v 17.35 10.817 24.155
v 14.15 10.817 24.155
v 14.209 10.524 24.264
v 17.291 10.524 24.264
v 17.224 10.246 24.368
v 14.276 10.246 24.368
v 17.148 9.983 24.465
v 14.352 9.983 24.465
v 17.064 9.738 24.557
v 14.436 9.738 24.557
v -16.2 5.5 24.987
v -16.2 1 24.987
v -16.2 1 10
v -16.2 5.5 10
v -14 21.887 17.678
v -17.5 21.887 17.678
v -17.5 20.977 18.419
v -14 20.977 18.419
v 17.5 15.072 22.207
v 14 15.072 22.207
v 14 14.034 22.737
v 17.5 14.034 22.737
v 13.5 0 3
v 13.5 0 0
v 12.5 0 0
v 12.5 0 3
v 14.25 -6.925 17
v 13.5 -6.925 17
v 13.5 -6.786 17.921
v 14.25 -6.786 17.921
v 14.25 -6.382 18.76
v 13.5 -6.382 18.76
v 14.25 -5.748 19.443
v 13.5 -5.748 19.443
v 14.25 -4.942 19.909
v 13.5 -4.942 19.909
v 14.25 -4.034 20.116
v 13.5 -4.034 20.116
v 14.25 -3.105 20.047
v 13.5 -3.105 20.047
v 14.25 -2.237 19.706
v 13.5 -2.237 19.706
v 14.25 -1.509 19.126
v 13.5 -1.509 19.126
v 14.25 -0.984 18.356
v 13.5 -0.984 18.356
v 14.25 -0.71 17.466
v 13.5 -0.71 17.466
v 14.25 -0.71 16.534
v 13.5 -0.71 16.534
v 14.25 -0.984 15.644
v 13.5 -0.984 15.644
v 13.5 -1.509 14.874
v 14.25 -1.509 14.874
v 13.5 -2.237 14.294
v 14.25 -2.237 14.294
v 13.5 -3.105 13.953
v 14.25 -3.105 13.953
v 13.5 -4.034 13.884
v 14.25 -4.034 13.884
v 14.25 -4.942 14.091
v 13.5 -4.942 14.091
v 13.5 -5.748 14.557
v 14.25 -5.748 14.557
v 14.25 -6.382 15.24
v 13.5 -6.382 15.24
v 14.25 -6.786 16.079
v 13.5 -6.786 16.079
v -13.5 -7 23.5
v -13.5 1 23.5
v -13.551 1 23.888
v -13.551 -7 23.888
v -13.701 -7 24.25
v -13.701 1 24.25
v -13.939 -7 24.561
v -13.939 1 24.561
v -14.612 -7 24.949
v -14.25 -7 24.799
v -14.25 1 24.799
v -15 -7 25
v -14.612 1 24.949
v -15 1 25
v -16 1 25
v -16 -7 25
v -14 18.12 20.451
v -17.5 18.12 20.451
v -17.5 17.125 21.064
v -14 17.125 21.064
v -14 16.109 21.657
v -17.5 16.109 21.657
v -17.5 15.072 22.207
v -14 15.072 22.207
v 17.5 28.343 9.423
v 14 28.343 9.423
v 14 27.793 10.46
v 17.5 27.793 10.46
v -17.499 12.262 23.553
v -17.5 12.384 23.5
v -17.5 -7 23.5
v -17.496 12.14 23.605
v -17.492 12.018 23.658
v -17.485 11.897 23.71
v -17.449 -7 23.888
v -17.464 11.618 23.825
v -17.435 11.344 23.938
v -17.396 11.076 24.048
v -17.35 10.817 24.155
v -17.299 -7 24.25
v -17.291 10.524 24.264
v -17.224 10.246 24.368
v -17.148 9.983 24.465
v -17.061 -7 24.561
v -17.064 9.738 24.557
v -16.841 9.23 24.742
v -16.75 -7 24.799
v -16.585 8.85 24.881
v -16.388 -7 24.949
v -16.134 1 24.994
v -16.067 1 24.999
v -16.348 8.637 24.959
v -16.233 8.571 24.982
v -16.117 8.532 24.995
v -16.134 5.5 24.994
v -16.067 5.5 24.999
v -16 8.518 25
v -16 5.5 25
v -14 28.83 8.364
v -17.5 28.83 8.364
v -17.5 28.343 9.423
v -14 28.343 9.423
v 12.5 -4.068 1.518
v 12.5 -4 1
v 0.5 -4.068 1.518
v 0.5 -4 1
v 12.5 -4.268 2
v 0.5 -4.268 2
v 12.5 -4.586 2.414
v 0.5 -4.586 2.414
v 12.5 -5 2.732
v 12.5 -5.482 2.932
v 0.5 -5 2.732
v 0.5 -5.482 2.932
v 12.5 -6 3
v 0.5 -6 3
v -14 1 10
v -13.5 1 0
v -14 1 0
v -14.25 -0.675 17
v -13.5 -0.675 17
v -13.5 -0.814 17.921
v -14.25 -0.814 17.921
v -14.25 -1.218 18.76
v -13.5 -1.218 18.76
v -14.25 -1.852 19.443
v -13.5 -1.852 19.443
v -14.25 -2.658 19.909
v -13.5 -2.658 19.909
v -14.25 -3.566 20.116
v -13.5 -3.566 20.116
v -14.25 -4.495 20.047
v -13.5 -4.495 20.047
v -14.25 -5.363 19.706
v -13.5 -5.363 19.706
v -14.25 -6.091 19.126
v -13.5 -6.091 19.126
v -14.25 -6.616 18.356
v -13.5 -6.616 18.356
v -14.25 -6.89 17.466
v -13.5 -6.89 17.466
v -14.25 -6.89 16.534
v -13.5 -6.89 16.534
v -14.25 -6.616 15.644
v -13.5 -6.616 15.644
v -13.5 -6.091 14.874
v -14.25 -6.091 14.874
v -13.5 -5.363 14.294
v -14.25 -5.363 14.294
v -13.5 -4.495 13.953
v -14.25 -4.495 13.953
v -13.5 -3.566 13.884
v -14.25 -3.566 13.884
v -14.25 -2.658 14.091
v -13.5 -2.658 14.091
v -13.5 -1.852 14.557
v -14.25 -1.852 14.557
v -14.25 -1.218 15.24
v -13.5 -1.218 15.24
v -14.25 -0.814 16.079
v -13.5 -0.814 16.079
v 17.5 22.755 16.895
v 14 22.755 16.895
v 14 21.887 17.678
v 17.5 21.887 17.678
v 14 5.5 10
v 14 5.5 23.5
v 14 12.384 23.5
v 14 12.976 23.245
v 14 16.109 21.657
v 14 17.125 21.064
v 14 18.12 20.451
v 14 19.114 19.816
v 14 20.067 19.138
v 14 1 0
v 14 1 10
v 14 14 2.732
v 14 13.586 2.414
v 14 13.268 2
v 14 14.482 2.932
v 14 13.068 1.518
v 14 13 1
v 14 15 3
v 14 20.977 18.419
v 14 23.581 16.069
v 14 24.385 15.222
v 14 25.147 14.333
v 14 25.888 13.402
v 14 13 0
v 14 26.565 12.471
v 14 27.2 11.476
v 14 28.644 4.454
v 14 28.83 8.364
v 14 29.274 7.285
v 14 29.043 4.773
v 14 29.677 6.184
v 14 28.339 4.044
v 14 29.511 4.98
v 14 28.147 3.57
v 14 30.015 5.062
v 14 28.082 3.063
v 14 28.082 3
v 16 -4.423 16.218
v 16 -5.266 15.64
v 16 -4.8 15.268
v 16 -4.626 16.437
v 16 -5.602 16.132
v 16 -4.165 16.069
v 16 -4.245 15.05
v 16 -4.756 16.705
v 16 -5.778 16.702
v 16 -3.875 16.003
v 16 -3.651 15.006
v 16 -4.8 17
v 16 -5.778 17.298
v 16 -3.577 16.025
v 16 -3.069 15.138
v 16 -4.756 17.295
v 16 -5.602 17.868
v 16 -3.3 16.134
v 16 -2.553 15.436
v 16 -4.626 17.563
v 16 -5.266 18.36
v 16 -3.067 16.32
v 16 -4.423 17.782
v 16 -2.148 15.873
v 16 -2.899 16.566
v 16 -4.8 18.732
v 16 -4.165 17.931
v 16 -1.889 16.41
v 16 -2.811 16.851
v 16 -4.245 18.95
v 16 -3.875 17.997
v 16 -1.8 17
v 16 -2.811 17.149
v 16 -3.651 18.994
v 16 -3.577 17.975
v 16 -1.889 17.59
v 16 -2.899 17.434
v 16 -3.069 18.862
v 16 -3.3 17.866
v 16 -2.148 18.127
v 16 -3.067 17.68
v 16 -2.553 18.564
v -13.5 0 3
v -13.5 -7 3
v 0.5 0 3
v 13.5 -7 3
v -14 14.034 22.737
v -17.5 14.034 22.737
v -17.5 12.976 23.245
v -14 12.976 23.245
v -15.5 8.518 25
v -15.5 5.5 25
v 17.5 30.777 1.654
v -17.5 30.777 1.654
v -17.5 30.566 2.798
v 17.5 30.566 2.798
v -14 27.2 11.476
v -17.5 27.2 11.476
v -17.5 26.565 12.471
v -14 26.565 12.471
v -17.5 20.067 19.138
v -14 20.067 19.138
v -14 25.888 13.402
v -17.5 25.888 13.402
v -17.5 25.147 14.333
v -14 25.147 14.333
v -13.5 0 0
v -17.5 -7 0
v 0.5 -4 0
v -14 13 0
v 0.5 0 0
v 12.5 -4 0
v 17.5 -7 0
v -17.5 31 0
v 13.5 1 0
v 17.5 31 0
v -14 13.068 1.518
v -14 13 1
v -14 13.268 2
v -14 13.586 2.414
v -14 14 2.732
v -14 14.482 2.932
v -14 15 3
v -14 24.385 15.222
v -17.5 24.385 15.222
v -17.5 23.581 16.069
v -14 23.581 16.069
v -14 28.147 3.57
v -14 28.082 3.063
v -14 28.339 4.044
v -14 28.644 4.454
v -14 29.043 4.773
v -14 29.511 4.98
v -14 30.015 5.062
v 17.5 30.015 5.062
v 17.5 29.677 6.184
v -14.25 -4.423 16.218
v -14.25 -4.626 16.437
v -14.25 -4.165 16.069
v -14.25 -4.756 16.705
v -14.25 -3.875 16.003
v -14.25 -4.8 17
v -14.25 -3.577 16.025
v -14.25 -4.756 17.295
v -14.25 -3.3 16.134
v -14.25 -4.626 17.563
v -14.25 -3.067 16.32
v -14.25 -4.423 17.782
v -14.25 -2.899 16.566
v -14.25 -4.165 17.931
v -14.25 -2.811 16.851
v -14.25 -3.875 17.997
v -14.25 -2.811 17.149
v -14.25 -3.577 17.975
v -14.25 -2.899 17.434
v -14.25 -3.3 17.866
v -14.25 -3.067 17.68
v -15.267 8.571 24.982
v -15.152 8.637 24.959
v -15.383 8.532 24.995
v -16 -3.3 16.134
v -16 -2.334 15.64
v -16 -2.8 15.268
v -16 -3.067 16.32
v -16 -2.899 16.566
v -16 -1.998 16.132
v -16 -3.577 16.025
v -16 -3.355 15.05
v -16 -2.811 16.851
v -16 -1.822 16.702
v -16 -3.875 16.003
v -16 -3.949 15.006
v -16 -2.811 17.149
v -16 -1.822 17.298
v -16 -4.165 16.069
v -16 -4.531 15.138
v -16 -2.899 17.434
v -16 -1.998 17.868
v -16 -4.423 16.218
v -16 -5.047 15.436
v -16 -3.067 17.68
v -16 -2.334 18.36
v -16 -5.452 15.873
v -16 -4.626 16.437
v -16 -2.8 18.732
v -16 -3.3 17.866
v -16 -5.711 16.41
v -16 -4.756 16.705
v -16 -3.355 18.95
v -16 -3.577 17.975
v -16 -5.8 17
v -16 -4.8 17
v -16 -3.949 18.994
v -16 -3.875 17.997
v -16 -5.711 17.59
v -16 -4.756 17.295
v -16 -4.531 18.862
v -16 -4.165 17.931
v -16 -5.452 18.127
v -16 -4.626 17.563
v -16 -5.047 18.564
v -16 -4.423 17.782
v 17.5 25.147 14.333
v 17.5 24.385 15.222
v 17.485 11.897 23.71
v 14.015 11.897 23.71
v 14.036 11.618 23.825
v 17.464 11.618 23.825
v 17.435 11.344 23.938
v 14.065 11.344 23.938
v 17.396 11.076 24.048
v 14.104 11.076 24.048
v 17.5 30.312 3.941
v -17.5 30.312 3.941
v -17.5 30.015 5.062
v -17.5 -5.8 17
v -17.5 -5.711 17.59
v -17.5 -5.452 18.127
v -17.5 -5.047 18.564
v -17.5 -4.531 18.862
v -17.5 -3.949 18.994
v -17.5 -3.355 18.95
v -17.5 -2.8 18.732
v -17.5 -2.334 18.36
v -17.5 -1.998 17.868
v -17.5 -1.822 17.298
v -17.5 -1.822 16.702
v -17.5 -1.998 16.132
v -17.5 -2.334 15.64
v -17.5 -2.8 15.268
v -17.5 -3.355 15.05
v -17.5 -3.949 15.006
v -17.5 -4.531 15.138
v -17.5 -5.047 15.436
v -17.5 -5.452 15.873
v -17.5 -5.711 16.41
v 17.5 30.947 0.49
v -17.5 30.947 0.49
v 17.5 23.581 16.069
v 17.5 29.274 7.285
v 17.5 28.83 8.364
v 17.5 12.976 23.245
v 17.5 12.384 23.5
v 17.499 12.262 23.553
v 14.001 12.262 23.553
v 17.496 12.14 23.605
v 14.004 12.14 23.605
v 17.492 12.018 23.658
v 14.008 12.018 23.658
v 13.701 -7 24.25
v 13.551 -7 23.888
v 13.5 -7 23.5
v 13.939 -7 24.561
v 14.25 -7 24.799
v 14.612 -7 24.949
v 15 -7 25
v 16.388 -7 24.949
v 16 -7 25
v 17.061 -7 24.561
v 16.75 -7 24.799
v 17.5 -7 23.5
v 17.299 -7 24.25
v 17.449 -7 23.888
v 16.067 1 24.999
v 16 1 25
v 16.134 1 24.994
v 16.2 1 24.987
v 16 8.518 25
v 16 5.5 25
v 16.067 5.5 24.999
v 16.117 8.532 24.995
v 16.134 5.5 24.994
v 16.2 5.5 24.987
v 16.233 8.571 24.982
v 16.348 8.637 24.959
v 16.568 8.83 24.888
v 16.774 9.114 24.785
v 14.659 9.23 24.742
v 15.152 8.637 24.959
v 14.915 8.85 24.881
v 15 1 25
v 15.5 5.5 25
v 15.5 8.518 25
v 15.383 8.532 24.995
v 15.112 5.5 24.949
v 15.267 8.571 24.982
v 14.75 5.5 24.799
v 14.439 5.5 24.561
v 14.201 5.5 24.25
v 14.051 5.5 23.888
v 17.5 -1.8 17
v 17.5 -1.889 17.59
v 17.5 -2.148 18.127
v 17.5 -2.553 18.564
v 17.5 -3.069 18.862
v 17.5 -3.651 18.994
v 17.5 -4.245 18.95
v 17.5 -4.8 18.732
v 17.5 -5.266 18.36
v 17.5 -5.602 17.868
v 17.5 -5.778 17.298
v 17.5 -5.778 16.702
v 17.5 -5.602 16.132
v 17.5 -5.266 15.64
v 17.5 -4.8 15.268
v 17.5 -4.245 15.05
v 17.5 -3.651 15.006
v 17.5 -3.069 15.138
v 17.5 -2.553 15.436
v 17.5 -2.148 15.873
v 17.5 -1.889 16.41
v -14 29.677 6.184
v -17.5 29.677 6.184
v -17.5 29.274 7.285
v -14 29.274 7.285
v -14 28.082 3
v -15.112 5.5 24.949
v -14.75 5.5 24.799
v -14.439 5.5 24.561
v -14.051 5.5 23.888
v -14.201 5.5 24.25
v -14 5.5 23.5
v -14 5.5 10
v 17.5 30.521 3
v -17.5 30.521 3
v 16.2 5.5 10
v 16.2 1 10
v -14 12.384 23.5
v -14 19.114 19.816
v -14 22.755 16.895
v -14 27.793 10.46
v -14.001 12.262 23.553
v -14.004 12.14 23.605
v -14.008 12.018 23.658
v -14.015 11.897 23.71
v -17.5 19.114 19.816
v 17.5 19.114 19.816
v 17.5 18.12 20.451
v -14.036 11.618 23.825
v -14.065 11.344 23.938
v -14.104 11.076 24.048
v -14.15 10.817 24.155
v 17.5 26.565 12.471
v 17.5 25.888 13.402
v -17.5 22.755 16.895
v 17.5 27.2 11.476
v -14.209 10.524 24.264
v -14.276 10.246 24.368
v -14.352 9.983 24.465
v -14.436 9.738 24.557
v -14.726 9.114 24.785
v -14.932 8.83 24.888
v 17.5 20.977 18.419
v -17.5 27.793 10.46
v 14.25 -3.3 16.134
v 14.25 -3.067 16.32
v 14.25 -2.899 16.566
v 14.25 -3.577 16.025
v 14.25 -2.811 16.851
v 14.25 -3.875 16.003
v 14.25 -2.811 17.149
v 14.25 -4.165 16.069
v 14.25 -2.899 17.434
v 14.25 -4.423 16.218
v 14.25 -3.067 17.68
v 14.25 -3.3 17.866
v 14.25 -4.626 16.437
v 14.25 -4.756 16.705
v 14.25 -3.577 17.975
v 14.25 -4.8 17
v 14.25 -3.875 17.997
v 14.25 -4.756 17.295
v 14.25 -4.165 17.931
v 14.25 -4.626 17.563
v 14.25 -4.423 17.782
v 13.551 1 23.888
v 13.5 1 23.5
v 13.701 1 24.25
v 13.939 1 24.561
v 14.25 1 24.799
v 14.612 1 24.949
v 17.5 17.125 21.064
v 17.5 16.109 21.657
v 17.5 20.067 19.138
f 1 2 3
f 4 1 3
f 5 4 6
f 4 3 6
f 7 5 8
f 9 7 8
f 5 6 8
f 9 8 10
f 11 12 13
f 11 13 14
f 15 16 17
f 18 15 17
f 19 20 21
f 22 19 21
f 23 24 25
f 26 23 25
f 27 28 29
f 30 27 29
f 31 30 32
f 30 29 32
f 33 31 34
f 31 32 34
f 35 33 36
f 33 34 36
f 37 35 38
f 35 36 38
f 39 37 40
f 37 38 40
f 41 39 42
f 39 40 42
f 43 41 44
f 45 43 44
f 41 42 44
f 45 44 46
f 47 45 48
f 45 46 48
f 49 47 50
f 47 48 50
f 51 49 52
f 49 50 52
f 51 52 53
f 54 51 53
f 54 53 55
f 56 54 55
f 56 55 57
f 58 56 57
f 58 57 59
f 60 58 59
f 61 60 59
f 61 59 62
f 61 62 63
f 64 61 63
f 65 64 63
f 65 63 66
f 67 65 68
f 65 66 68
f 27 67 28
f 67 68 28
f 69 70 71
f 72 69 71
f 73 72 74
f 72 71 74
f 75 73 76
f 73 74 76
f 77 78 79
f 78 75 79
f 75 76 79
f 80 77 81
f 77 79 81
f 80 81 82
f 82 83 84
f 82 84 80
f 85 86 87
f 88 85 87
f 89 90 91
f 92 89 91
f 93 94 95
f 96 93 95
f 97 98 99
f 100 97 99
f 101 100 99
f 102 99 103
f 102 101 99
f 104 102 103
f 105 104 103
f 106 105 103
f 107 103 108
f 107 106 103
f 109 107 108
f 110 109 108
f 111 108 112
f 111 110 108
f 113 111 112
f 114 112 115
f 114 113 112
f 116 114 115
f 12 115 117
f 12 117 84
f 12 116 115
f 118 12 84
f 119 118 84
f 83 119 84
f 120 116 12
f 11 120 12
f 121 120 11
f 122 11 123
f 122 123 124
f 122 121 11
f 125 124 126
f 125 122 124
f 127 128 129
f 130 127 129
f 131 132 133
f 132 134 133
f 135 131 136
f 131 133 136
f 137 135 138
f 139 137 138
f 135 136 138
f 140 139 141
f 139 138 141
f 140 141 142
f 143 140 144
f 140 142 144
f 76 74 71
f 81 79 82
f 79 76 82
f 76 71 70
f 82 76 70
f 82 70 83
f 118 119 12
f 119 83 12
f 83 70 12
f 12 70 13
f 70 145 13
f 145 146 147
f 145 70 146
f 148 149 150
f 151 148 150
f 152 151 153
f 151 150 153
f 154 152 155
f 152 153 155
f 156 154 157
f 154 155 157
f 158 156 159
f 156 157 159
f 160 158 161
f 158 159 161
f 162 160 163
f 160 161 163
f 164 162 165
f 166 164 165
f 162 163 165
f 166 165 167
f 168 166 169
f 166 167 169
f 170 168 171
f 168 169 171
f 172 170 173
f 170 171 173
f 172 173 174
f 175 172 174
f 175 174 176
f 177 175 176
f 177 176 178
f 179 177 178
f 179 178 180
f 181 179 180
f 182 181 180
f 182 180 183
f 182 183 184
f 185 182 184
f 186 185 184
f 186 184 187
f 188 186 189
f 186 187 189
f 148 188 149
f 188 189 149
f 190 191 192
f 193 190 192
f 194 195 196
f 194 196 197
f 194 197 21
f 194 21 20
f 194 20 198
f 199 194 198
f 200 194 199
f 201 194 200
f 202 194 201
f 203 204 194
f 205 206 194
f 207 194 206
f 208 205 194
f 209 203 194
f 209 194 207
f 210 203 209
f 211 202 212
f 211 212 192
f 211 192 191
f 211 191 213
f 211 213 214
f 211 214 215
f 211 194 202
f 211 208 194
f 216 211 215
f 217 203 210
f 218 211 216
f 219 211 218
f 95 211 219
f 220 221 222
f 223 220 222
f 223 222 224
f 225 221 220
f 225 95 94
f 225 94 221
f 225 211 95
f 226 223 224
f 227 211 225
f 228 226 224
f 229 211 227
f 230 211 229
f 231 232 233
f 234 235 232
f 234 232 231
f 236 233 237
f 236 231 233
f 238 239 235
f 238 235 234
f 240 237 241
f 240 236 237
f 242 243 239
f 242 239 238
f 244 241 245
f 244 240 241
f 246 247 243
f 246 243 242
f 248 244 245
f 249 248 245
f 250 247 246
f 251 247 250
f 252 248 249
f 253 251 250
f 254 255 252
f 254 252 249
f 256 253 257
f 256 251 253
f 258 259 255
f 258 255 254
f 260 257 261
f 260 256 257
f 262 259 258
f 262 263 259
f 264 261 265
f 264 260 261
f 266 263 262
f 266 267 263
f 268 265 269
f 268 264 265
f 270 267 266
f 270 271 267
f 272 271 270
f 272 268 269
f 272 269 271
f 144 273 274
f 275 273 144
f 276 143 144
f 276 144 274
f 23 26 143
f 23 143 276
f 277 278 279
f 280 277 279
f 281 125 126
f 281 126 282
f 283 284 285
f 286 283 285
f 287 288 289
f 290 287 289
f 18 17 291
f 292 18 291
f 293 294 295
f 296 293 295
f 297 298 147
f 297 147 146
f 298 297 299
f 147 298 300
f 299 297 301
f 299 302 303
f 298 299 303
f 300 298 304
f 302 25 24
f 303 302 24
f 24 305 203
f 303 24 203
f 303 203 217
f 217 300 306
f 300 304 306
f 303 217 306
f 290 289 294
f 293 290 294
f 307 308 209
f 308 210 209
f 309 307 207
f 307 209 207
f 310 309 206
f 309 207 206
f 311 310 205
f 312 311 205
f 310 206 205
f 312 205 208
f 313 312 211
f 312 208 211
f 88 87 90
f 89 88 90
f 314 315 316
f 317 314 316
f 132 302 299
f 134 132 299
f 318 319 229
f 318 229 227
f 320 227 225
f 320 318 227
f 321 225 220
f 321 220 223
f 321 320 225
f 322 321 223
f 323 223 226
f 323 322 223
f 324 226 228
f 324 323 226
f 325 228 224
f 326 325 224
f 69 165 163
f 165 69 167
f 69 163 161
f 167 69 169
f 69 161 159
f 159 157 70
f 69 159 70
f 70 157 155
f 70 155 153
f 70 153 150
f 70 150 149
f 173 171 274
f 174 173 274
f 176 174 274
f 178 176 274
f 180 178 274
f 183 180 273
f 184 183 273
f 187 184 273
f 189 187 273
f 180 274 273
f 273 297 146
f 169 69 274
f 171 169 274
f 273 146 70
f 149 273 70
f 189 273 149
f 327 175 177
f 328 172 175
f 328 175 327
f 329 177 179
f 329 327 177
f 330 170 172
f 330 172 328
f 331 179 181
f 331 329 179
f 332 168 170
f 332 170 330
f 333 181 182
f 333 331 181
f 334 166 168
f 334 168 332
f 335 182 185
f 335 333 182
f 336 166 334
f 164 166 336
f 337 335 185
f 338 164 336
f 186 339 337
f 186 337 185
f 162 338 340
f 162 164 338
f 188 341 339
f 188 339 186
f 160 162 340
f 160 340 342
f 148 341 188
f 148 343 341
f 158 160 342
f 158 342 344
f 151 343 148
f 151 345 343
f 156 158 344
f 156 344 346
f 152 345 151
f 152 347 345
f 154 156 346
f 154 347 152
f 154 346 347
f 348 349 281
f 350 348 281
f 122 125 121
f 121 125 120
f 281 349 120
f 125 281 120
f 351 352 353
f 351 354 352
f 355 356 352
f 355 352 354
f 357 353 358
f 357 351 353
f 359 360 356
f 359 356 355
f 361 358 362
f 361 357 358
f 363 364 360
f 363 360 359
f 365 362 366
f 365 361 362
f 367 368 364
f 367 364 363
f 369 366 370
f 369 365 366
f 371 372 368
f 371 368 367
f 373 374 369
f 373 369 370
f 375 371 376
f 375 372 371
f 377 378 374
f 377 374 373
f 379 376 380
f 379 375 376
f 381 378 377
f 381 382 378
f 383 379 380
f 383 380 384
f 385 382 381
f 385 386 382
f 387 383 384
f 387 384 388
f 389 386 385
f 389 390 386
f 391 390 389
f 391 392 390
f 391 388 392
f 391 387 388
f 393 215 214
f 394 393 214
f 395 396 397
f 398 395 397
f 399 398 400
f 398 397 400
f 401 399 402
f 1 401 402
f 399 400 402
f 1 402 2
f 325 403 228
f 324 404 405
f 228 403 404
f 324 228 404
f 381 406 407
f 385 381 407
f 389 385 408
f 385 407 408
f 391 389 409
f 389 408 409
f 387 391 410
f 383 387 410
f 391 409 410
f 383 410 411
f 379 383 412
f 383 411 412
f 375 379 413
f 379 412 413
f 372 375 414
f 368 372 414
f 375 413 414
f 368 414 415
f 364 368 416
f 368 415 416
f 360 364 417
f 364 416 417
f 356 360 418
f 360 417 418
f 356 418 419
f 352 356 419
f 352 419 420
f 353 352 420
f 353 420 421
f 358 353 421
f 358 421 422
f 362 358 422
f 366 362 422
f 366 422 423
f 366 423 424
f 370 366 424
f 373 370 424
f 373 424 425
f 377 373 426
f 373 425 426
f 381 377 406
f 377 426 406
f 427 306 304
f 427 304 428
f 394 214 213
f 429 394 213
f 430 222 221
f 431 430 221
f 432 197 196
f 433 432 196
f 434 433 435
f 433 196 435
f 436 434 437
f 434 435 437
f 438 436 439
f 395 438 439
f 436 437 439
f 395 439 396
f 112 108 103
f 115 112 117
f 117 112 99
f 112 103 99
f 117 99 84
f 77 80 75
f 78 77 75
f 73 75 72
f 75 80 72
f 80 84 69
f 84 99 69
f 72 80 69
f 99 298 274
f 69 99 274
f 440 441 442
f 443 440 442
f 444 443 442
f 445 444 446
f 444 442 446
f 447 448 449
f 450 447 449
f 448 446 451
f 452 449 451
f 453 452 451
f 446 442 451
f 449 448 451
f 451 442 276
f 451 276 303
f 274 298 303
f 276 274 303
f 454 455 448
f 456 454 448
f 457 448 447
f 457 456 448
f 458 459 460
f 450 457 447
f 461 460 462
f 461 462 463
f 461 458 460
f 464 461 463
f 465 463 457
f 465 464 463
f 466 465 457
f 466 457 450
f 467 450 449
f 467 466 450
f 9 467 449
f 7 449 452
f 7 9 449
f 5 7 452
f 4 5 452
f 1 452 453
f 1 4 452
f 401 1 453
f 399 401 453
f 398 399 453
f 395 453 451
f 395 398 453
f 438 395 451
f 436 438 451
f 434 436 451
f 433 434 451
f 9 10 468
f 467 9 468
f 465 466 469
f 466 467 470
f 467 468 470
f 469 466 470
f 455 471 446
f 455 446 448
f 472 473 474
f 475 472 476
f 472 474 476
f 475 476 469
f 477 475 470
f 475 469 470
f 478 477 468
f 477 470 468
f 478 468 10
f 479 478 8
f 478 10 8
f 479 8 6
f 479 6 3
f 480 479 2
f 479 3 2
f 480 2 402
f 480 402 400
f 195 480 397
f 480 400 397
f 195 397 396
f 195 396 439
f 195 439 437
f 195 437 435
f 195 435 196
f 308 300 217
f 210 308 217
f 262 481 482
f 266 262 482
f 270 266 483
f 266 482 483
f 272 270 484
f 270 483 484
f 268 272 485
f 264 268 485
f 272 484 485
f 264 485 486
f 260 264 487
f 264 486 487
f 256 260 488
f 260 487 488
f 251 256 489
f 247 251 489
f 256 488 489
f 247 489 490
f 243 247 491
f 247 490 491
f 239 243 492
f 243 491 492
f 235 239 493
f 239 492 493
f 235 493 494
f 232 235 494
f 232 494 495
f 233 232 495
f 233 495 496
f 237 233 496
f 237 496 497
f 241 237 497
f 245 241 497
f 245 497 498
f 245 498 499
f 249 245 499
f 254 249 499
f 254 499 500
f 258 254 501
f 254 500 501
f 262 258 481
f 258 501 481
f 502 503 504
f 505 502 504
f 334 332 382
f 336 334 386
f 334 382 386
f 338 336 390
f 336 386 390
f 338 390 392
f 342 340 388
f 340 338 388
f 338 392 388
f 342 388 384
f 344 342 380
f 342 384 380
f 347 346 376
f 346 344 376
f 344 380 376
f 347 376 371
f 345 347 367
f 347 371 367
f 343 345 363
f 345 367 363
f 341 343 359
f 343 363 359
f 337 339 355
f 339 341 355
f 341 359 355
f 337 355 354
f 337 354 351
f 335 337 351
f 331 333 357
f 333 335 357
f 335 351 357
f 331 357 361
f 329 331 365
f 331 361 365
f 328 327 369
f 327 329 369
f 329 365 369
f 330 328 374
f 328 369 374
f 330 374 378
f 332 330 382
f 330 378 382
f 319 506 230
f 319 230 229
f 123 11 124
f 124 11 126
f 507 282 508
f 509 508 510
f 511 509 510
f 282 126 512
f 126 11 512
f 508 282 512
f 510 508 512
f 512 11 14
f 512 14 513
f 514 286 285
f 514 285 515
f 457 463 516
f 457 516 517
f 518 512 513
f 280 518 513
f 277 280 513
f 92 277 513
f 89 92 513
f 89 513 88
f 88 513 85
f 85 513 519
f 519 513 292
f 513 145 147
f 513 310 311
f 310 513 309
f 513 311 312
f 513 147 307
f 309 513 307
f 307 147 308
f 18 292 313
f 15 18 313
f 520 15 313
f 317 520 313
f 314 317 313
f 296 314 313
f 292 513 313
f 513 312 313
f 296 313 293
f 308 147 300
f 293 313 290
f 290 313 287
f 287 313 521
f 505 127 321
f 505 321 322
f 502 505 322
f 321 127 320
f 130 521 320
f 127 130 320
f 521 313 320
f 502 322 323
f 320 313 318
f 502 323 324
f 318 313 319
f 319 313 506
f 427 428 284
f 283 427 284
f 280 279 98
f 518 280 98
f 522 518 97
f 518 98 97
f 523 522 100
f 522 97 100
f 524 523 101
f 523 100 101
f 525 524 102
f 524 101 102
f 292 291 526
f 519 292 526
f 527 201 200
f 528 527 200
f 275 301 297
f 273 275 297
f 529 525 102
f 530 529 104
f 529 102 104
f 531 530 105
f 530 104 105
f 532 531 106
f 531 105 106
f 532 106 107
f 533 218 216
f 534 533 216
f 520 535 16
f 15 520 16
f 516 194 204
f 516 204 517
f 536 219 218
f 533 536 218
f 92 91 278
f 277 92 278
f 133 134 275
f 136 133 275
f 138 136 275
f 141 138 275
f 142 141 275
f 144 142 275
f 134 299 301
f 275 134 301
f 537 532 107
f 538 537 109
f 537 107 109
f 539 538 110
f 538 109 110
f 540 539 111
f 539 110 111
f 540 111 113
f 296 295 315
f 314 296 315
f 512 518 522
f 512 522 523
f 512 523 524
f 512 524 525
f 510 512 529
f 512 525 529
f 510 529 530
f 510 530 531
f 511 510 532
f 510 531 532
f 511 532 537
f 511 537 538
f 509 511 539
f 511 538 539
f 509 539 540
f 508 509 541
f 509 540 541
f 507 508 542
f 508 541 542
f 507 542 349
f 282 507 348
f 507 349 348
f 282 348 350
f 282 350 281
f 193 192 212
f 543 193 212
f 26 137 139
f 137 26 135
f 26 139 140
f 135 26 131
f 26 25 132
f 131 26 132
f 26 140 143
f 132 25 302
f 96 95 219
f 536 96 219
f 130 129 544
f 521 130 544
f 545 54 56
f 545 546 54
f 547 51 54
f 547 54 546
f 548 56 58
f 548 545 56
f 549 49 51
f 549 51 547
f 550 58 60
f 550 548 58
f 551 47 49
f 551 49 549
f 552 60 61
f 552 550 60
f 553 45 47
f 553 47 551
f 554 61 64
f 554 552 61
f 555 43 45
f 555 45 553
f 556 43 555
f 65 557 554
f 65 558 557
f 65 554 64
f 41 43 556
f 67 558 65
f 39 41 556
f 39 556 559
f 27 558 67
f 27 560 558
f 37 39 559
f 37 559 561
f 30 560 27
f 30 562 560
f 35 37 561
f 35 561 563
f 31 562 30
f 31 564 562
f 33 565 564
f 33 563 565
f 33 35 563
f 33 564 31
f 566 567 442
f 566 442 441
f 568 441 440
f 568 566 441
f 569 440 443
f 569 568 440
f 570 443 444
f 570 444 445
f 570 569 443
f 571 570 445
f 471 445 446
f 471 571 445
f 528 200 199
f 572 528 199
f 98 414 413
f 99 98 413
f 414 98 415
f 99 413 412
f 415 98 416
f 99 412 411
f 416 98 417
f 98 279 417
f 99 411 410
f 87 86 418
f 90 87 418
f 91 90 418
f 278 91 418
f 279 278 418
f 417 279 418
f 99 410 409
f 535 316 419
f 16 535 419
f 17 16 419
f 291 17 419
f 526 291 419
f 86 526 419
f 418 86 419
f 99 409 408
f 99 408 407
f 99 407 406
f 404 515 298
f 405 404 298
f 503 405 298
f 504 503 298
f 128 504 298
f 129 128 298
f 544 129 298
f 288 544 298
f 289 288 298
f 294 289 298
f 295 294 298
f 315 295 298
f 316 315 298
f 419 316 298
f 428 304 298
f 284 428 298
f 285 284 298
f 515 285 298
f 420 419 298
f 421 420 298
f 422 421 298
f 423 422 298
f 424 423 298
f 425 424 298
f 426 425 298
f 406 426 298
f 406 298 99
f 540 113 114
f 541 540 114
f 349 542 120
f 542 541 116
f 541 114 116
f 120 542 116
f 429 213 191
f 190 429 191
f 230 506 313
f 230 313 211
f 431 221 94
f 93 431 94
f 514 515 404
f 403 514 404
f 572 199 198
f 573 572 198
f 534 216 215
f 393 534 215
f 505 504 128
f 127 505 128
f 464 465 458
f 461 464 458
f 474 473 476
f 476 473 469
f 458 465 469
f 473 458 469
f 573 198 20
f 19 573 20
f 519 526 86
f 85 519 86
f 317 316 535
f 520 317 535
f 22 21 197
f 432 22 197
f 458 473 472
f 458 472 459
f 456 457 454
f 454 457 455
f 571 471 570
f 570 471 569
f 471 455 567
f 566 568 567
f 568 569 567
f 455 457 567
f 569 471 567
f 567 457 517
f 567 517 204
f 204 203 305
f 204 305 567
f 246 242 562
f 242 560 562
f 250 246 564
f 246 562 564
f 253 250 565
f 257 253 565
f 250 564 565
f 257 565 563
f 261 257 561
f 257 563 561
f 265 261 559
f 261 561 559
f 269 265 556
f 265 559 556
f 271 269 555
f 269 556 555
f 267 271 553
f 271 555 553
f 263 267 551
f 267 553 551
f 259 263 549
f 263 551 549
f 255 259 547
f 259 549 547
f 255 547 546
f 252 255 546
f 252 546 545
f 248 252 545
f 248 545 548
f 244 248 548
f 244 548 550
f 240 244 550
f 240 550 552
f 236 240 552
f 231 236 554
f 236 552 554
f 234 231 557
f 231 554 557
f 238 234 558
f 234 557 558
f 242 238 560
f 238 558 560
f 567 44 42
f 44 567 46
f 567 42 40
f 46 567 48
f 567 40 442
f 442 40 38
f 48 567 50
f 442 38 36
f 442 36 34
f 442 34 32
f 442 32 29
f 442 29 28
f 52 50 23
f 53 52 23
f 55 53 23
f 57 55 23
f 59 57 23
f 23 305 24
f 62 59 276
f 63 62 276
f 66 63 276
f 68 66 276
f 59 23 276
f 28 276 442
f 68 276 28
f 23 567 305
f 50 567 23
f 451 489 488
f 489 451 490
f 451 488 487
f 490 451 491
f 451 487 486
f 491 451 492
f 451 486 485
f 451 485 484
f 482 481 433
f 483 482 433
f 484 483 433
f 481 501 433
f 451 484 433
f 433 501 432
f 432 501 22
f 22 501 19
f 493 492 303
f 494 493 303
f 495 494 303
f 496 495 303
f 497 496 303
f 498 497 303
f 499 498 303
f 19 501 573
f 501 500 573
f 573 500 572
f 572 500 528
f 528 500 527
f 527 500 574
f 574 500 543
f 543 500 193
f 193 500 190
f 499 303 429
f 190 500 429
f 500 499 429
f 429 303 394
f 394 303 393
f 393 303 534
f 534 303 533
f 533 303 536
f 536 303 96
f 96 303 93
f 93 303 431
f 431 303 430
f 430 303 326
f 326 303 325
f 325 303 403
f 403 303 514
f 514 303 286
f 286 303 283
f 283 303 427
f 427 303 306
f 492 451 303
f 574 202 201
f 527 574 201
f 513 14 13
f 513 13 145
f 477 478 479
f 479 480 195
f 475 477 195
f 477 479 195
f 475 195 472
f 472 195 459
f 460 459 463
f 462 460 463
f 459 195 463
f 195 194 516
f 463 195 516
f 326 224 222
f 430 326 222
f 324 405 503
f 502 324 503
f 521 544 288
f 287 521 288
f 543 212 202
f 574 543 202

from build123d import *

# Parameters (mm, degrees)
F0_W         = 28
F0_H         = 18
F1_DEPTH     = 3
F2_DEPTH     = 25
F3_R         = 2
F4_R         = 1
F5_DEPTH     = 50
F0_W_2       = 2.2
F0_H_2       = 4.5
F6_DEPTH     = 10
F9_DEPTH     = 100
F4_R_2       = 3.125
F10_R        = 3.125
F10_R_2      = 1
F11_DEPTH    = 0.75
F12_T1_DEPTH = 25.6433879336
F12_T3_DEPTH = 13.1433879336
F12_T5_DEPTH = 15.5
F13_DEPTH    = 35
F14_DEPTH    = 39
F15_T1_DEPTH = 28
F7_R         = 2
F7_R_2       = 1
F8_R         = 2
F8_R_2       = 1
F16_DEPTH    = 1.5


# Not quite as in the source:
# - a fillet or chamfer that OpenCascade refuses, or shapes differently, is made with other operations: its cross-section is extruded or revolved along the edge and cut away or added


with BuildPart() as f1:
    # F0 (on Top) → F1 (new body)
    with BuildSketch(Plane.XY):
        Polygon((-17.5, 0), (-17.5, -7), (-13.5, -7), (-13.5, 0), (-13.5, 1), (-14, 1), (-16.2, 1), (-16.2, 5.5), (-14, 5.5), (-14, 13), (-14, 31), (-17.5, 31), align=None)
        Polygon((-13.5, 0), (-13.5, -7), (13.5, -7), (13.5, 0), (12.5, 0), (12.5, -4), (0.5, -4), (0.5, 0), align=None)
        Polygon((13.5, 0), (13.5, -7), (17.5, -7), (17.5, 0), (17.5, 31), (14, 31), (14, 13), (14, 5.5), (16.2, 5.5), (16.2, 1), (14, 1), (13.5, 1), align=None)
        with Locations((0, 22)):
            Rectangle(F0_W, F0_H)
    extrude(amount=F1_DEPTH)

    # F0 (on Top) → F2 (join)
    with BuildSketch(Plane.XY):
        Polygon((-17.5, 0), (-17.5, -7), (-13.5, -7), (-13.5, 0), (-13.5, 1), (-14, 1), (-16.2, 1), (-16.2, 5.5), (-14, 5.5), (-14, 13), (-14, 31), (-17.5, 31), align=None)
        Polygon((13.5, 0), (13.5, -7), (17.5, -7), (17.5, 0), (17.5, 31), (14, 31), (14, 13), (14, 5.5), (16.2, 5.5), (16.2, 1), (14, 1), (13.5, 1), align=None)
    extrude(amount=F2_DEPTH)

    # F3
    f3_edges = [f1.edges().sort_by_distance(p)[0] for p in [
        (0, 13, 3),
        (6.5, -4, 3),
    ]]
    fillet(f3_edges, radius=F3_R)

    # F4 (on face) → F5 (cut, symmetric)
    with BuildSketch(Plane(origin=(13.5, 0, 0), x_dir=(0, -1, 0), z_dir=(-1, 0, 0))):
        with Locations((3.8, 17)):
            Circle(F4_R)
    extrude(amount=F5_DEPTH, both=True, mode=Mode.SUBTRACT)

    # F0 (on Top) → F6 (join)
    with BuildSketch(Plane.XY):
        with Locations((15.1, 3.25)):
            Rectangle(F0_W_2, F0_H_2)
        with Locations((-15.1, 3.25)):
            Rectangle(F0_W_2, F0_H_2)
    extrude(amount=F6_DEPTH)

    # F7 (on face) → F9 (cut)
    with BuildSketch(Plane(origin=(-17.5, 0, 0), x_dir=(0, -1, 0), z_dir=(-1, 0, 0))):
        Polygon((-31, 25), (-31, 3), (-30.5205184888, 3), (-30.311506, 3.940513), (-30.015185, 5.062344), (-29.67651, 6.184174), (-29.274339, 7.284839), (-28.829835, 8.364339), (-28.343022, 9.422672), (-27.792668, 10.459839), (-27.200003, 11.475841), (-26.565008, 12.470677), (-25.88768, 13.402016), (-25.146834, 14.333332), (-24.384844, 15.222339), (-23.580522, 16.069015), (-22.755012, 16.894503), (-21.887171, 17.67768), (-20.97702, 18.418505), (-20.066847, 19.138164), (-19.114343, 19.815513), (-18.119507, 20.450509), (-17.124671, 21.064339), (-16.108669, 21.657003), (-15.071502, 22.207335), (-14.034334, 22.736502), (-12.976001, 23.244503), (-11.896502, 23.710172), (-10.817003, 24.154675), (-9.737503, 24.556847), (-8.636839, 24.958997), (-8.5183879336, 25), align=None)
    extrude(amount=-F9_DEPTH, mode=Mode.SUBTRACT)

    # F4 (on face) + F10 (on face) → F11 (cut, symmetric)
    with BuildSketch(Plane(origin=(13.5, 0, 0), x_dir=(0, -1, 0), z_dir=(-1, 0, 0))):
        with Locations((3.8, 17)):
            Circle(F4_R_2)
        with Locations((3.8, 17)):
            Circle(F4_R, mode=Mode.SUBTRACT)
    with BuildSketch(Plane.YZ.offset(-13.5)):
        with Locations((-3.8, 17)):
            Circle(F10_R)
        with Locations((-3.8, 17)):
            Circle(F10_R_2, mode=Mode.SUBTRACT)
    extrude(amount=F11_DEPTH, both=True, dir=(-1, 0, 0), mode=Mode.SUBTRACT)

    # F12: fillet of radius 1.5 on 6 edges, made by hand

    # F12_s2 → F12_t1 (cut)
    with BuildSketch(Plane.XZ.offset(-14.8933879336)):
        with BuildLine():
            ThreePointArc((16, 25), (17.0606601718, 24.5606601718), (17.5, 23.5))
            Line((17.5, 23.5), (17.5, 25))
            Line((17.5, 25), (16, 25))
        make_face()
        with BuildLine():
            ThreePointArc((-17.5, 23.5), (-17.0606601718, 24.5606601718), (-16, 25))
            Line((-16, 25), (-17.5, 25))
            Line((-17.5, 25), (-17.5, 23.5))
        make_face()
    extrude(amount=F12_T1_DEPTH, mode=Mode.SUBTRACT)

    # F12_s4 → F12_t3 (cut)
    with BuildSketch(Plane.XZ.offset(-14.8933879336)):
        with BuildLine():
            ThreePointArc((15.5, 25), (14.4393398282, 24.5606601718), (14, 23.5))
            Line((14, 23.5), (14, 25))
            Line((14, 25), (15.5, 25))
        make_face()
        with BuildLine():
            ThreePointArc((-14, 23.5), (-14.4393398282, 24.5606601718), (-15.5, 25))
            Line((-15.5, 25), (-14, 25))
            Line((-14, 25), (-14, 23.5))
        make_face()
    extrude(amount=F12_T3_DEPTH, mode=Mode.SUBTRACT)

    # F12_s6 → F12_t5 (cut)
    with BuildSketch(Plane.XZ.offset(-4.75)):
        with BuildLine():
            ThreePointArc((13.5, 23.5), (13.9393398282, 24.5606601718), (15, 25))
            Line((15, 25), (13.5, 25))
            Line((13.5, 25), (13.5, 23.5))
        make_face()
        with BuildLine():
            ThreePointArc((-13.5, 23.5), (-13.9393398282, 24.5606601718), (-15, 25))
            Line((-15, 25), (-13.5, 25))
            Line((-13.5, 25), (-13.5, 23.5))
        make_face()
    extrude(amount=F12_T5_DEPTH, mode=Mode.SUBTRACT)

    # F7 (on face) → F13 (join)
    with BuildSketch(Plane(origin=(-17.5, 0, 0), x_dir=(0, -1, 0), z_dir=(-1, 0, 0))):
        Polygon((-30.311506, 3.940513), (-30.5205184888, 3), (-28.0815777779, 3), (-28.0815777779, 5.062344), (-30.015185, 5.062344), align=None)
    extrude(amount=-F13_DEPTH)

    # F7 (on face) → F14 (cut)
    with BuildSketch(Plane(origin=(-17.5, 0, 0), x_dir=(0, -1, 0), z_dir=(-1, 0, 0))):
        Polygon((-31, 3), (-31, 0), (-30.946502, 0.490336), (-30.777175, 1.654498), (-30.565517, 2.797516), (-30.5205184888, 3), align=None)
    extrude(amount=-F14_DEPTH, mode=Mode.SUBTRACT)

    # F15: fillet of radius 2 on 1 edges, made by hand

    # F15_s2 → F15_t1 (cut)
    with BuildSketch(Plane.YZ.offset(-14)):
        with BuildLine():
            ThreePointArc((28.0815777779, 3.063446304), (28.6440824638, 4.4539883645), (30.015185, 5.062344))
            Line((30.015185, 5.062344), (28.0815777779, 5.062344))
            Line((28.0815777779, 5.062344), (28.0815777779, 3.063446304))
        make_face()
    extrude(amount=F15_T1_DEPTH, mode=Mode.SUBTRACT)

    # F7 (on face) + F8 (on face) → F16 (cut, symmetric)
    with BuildSketch(Plane(origin=(-17.5, 0, 0), x_dir=(0, -1, 0), z_dir=(-1, 0, 0))):
        with Locations((3.8, 17)):
            Circle(F7_R)
        with Locations((3.8, 17)):
            Circle(F7_R_2, mode=Mode.SUBTRACT)
    with BuildSketch(Plane.YZ.offset(17.5)):
        with Locations((-3.8, 17)):
            Circle(F8_R)
        with Locations((-3.8, 17)):
            Circle(F8_R_2, mode=Mode.SUBTRACT)
    extrude(amount=F16_DEPTH, both=True, dir=(-1, 0, 0), mode=Mode.SUBTRACT)


solid = f1.part
